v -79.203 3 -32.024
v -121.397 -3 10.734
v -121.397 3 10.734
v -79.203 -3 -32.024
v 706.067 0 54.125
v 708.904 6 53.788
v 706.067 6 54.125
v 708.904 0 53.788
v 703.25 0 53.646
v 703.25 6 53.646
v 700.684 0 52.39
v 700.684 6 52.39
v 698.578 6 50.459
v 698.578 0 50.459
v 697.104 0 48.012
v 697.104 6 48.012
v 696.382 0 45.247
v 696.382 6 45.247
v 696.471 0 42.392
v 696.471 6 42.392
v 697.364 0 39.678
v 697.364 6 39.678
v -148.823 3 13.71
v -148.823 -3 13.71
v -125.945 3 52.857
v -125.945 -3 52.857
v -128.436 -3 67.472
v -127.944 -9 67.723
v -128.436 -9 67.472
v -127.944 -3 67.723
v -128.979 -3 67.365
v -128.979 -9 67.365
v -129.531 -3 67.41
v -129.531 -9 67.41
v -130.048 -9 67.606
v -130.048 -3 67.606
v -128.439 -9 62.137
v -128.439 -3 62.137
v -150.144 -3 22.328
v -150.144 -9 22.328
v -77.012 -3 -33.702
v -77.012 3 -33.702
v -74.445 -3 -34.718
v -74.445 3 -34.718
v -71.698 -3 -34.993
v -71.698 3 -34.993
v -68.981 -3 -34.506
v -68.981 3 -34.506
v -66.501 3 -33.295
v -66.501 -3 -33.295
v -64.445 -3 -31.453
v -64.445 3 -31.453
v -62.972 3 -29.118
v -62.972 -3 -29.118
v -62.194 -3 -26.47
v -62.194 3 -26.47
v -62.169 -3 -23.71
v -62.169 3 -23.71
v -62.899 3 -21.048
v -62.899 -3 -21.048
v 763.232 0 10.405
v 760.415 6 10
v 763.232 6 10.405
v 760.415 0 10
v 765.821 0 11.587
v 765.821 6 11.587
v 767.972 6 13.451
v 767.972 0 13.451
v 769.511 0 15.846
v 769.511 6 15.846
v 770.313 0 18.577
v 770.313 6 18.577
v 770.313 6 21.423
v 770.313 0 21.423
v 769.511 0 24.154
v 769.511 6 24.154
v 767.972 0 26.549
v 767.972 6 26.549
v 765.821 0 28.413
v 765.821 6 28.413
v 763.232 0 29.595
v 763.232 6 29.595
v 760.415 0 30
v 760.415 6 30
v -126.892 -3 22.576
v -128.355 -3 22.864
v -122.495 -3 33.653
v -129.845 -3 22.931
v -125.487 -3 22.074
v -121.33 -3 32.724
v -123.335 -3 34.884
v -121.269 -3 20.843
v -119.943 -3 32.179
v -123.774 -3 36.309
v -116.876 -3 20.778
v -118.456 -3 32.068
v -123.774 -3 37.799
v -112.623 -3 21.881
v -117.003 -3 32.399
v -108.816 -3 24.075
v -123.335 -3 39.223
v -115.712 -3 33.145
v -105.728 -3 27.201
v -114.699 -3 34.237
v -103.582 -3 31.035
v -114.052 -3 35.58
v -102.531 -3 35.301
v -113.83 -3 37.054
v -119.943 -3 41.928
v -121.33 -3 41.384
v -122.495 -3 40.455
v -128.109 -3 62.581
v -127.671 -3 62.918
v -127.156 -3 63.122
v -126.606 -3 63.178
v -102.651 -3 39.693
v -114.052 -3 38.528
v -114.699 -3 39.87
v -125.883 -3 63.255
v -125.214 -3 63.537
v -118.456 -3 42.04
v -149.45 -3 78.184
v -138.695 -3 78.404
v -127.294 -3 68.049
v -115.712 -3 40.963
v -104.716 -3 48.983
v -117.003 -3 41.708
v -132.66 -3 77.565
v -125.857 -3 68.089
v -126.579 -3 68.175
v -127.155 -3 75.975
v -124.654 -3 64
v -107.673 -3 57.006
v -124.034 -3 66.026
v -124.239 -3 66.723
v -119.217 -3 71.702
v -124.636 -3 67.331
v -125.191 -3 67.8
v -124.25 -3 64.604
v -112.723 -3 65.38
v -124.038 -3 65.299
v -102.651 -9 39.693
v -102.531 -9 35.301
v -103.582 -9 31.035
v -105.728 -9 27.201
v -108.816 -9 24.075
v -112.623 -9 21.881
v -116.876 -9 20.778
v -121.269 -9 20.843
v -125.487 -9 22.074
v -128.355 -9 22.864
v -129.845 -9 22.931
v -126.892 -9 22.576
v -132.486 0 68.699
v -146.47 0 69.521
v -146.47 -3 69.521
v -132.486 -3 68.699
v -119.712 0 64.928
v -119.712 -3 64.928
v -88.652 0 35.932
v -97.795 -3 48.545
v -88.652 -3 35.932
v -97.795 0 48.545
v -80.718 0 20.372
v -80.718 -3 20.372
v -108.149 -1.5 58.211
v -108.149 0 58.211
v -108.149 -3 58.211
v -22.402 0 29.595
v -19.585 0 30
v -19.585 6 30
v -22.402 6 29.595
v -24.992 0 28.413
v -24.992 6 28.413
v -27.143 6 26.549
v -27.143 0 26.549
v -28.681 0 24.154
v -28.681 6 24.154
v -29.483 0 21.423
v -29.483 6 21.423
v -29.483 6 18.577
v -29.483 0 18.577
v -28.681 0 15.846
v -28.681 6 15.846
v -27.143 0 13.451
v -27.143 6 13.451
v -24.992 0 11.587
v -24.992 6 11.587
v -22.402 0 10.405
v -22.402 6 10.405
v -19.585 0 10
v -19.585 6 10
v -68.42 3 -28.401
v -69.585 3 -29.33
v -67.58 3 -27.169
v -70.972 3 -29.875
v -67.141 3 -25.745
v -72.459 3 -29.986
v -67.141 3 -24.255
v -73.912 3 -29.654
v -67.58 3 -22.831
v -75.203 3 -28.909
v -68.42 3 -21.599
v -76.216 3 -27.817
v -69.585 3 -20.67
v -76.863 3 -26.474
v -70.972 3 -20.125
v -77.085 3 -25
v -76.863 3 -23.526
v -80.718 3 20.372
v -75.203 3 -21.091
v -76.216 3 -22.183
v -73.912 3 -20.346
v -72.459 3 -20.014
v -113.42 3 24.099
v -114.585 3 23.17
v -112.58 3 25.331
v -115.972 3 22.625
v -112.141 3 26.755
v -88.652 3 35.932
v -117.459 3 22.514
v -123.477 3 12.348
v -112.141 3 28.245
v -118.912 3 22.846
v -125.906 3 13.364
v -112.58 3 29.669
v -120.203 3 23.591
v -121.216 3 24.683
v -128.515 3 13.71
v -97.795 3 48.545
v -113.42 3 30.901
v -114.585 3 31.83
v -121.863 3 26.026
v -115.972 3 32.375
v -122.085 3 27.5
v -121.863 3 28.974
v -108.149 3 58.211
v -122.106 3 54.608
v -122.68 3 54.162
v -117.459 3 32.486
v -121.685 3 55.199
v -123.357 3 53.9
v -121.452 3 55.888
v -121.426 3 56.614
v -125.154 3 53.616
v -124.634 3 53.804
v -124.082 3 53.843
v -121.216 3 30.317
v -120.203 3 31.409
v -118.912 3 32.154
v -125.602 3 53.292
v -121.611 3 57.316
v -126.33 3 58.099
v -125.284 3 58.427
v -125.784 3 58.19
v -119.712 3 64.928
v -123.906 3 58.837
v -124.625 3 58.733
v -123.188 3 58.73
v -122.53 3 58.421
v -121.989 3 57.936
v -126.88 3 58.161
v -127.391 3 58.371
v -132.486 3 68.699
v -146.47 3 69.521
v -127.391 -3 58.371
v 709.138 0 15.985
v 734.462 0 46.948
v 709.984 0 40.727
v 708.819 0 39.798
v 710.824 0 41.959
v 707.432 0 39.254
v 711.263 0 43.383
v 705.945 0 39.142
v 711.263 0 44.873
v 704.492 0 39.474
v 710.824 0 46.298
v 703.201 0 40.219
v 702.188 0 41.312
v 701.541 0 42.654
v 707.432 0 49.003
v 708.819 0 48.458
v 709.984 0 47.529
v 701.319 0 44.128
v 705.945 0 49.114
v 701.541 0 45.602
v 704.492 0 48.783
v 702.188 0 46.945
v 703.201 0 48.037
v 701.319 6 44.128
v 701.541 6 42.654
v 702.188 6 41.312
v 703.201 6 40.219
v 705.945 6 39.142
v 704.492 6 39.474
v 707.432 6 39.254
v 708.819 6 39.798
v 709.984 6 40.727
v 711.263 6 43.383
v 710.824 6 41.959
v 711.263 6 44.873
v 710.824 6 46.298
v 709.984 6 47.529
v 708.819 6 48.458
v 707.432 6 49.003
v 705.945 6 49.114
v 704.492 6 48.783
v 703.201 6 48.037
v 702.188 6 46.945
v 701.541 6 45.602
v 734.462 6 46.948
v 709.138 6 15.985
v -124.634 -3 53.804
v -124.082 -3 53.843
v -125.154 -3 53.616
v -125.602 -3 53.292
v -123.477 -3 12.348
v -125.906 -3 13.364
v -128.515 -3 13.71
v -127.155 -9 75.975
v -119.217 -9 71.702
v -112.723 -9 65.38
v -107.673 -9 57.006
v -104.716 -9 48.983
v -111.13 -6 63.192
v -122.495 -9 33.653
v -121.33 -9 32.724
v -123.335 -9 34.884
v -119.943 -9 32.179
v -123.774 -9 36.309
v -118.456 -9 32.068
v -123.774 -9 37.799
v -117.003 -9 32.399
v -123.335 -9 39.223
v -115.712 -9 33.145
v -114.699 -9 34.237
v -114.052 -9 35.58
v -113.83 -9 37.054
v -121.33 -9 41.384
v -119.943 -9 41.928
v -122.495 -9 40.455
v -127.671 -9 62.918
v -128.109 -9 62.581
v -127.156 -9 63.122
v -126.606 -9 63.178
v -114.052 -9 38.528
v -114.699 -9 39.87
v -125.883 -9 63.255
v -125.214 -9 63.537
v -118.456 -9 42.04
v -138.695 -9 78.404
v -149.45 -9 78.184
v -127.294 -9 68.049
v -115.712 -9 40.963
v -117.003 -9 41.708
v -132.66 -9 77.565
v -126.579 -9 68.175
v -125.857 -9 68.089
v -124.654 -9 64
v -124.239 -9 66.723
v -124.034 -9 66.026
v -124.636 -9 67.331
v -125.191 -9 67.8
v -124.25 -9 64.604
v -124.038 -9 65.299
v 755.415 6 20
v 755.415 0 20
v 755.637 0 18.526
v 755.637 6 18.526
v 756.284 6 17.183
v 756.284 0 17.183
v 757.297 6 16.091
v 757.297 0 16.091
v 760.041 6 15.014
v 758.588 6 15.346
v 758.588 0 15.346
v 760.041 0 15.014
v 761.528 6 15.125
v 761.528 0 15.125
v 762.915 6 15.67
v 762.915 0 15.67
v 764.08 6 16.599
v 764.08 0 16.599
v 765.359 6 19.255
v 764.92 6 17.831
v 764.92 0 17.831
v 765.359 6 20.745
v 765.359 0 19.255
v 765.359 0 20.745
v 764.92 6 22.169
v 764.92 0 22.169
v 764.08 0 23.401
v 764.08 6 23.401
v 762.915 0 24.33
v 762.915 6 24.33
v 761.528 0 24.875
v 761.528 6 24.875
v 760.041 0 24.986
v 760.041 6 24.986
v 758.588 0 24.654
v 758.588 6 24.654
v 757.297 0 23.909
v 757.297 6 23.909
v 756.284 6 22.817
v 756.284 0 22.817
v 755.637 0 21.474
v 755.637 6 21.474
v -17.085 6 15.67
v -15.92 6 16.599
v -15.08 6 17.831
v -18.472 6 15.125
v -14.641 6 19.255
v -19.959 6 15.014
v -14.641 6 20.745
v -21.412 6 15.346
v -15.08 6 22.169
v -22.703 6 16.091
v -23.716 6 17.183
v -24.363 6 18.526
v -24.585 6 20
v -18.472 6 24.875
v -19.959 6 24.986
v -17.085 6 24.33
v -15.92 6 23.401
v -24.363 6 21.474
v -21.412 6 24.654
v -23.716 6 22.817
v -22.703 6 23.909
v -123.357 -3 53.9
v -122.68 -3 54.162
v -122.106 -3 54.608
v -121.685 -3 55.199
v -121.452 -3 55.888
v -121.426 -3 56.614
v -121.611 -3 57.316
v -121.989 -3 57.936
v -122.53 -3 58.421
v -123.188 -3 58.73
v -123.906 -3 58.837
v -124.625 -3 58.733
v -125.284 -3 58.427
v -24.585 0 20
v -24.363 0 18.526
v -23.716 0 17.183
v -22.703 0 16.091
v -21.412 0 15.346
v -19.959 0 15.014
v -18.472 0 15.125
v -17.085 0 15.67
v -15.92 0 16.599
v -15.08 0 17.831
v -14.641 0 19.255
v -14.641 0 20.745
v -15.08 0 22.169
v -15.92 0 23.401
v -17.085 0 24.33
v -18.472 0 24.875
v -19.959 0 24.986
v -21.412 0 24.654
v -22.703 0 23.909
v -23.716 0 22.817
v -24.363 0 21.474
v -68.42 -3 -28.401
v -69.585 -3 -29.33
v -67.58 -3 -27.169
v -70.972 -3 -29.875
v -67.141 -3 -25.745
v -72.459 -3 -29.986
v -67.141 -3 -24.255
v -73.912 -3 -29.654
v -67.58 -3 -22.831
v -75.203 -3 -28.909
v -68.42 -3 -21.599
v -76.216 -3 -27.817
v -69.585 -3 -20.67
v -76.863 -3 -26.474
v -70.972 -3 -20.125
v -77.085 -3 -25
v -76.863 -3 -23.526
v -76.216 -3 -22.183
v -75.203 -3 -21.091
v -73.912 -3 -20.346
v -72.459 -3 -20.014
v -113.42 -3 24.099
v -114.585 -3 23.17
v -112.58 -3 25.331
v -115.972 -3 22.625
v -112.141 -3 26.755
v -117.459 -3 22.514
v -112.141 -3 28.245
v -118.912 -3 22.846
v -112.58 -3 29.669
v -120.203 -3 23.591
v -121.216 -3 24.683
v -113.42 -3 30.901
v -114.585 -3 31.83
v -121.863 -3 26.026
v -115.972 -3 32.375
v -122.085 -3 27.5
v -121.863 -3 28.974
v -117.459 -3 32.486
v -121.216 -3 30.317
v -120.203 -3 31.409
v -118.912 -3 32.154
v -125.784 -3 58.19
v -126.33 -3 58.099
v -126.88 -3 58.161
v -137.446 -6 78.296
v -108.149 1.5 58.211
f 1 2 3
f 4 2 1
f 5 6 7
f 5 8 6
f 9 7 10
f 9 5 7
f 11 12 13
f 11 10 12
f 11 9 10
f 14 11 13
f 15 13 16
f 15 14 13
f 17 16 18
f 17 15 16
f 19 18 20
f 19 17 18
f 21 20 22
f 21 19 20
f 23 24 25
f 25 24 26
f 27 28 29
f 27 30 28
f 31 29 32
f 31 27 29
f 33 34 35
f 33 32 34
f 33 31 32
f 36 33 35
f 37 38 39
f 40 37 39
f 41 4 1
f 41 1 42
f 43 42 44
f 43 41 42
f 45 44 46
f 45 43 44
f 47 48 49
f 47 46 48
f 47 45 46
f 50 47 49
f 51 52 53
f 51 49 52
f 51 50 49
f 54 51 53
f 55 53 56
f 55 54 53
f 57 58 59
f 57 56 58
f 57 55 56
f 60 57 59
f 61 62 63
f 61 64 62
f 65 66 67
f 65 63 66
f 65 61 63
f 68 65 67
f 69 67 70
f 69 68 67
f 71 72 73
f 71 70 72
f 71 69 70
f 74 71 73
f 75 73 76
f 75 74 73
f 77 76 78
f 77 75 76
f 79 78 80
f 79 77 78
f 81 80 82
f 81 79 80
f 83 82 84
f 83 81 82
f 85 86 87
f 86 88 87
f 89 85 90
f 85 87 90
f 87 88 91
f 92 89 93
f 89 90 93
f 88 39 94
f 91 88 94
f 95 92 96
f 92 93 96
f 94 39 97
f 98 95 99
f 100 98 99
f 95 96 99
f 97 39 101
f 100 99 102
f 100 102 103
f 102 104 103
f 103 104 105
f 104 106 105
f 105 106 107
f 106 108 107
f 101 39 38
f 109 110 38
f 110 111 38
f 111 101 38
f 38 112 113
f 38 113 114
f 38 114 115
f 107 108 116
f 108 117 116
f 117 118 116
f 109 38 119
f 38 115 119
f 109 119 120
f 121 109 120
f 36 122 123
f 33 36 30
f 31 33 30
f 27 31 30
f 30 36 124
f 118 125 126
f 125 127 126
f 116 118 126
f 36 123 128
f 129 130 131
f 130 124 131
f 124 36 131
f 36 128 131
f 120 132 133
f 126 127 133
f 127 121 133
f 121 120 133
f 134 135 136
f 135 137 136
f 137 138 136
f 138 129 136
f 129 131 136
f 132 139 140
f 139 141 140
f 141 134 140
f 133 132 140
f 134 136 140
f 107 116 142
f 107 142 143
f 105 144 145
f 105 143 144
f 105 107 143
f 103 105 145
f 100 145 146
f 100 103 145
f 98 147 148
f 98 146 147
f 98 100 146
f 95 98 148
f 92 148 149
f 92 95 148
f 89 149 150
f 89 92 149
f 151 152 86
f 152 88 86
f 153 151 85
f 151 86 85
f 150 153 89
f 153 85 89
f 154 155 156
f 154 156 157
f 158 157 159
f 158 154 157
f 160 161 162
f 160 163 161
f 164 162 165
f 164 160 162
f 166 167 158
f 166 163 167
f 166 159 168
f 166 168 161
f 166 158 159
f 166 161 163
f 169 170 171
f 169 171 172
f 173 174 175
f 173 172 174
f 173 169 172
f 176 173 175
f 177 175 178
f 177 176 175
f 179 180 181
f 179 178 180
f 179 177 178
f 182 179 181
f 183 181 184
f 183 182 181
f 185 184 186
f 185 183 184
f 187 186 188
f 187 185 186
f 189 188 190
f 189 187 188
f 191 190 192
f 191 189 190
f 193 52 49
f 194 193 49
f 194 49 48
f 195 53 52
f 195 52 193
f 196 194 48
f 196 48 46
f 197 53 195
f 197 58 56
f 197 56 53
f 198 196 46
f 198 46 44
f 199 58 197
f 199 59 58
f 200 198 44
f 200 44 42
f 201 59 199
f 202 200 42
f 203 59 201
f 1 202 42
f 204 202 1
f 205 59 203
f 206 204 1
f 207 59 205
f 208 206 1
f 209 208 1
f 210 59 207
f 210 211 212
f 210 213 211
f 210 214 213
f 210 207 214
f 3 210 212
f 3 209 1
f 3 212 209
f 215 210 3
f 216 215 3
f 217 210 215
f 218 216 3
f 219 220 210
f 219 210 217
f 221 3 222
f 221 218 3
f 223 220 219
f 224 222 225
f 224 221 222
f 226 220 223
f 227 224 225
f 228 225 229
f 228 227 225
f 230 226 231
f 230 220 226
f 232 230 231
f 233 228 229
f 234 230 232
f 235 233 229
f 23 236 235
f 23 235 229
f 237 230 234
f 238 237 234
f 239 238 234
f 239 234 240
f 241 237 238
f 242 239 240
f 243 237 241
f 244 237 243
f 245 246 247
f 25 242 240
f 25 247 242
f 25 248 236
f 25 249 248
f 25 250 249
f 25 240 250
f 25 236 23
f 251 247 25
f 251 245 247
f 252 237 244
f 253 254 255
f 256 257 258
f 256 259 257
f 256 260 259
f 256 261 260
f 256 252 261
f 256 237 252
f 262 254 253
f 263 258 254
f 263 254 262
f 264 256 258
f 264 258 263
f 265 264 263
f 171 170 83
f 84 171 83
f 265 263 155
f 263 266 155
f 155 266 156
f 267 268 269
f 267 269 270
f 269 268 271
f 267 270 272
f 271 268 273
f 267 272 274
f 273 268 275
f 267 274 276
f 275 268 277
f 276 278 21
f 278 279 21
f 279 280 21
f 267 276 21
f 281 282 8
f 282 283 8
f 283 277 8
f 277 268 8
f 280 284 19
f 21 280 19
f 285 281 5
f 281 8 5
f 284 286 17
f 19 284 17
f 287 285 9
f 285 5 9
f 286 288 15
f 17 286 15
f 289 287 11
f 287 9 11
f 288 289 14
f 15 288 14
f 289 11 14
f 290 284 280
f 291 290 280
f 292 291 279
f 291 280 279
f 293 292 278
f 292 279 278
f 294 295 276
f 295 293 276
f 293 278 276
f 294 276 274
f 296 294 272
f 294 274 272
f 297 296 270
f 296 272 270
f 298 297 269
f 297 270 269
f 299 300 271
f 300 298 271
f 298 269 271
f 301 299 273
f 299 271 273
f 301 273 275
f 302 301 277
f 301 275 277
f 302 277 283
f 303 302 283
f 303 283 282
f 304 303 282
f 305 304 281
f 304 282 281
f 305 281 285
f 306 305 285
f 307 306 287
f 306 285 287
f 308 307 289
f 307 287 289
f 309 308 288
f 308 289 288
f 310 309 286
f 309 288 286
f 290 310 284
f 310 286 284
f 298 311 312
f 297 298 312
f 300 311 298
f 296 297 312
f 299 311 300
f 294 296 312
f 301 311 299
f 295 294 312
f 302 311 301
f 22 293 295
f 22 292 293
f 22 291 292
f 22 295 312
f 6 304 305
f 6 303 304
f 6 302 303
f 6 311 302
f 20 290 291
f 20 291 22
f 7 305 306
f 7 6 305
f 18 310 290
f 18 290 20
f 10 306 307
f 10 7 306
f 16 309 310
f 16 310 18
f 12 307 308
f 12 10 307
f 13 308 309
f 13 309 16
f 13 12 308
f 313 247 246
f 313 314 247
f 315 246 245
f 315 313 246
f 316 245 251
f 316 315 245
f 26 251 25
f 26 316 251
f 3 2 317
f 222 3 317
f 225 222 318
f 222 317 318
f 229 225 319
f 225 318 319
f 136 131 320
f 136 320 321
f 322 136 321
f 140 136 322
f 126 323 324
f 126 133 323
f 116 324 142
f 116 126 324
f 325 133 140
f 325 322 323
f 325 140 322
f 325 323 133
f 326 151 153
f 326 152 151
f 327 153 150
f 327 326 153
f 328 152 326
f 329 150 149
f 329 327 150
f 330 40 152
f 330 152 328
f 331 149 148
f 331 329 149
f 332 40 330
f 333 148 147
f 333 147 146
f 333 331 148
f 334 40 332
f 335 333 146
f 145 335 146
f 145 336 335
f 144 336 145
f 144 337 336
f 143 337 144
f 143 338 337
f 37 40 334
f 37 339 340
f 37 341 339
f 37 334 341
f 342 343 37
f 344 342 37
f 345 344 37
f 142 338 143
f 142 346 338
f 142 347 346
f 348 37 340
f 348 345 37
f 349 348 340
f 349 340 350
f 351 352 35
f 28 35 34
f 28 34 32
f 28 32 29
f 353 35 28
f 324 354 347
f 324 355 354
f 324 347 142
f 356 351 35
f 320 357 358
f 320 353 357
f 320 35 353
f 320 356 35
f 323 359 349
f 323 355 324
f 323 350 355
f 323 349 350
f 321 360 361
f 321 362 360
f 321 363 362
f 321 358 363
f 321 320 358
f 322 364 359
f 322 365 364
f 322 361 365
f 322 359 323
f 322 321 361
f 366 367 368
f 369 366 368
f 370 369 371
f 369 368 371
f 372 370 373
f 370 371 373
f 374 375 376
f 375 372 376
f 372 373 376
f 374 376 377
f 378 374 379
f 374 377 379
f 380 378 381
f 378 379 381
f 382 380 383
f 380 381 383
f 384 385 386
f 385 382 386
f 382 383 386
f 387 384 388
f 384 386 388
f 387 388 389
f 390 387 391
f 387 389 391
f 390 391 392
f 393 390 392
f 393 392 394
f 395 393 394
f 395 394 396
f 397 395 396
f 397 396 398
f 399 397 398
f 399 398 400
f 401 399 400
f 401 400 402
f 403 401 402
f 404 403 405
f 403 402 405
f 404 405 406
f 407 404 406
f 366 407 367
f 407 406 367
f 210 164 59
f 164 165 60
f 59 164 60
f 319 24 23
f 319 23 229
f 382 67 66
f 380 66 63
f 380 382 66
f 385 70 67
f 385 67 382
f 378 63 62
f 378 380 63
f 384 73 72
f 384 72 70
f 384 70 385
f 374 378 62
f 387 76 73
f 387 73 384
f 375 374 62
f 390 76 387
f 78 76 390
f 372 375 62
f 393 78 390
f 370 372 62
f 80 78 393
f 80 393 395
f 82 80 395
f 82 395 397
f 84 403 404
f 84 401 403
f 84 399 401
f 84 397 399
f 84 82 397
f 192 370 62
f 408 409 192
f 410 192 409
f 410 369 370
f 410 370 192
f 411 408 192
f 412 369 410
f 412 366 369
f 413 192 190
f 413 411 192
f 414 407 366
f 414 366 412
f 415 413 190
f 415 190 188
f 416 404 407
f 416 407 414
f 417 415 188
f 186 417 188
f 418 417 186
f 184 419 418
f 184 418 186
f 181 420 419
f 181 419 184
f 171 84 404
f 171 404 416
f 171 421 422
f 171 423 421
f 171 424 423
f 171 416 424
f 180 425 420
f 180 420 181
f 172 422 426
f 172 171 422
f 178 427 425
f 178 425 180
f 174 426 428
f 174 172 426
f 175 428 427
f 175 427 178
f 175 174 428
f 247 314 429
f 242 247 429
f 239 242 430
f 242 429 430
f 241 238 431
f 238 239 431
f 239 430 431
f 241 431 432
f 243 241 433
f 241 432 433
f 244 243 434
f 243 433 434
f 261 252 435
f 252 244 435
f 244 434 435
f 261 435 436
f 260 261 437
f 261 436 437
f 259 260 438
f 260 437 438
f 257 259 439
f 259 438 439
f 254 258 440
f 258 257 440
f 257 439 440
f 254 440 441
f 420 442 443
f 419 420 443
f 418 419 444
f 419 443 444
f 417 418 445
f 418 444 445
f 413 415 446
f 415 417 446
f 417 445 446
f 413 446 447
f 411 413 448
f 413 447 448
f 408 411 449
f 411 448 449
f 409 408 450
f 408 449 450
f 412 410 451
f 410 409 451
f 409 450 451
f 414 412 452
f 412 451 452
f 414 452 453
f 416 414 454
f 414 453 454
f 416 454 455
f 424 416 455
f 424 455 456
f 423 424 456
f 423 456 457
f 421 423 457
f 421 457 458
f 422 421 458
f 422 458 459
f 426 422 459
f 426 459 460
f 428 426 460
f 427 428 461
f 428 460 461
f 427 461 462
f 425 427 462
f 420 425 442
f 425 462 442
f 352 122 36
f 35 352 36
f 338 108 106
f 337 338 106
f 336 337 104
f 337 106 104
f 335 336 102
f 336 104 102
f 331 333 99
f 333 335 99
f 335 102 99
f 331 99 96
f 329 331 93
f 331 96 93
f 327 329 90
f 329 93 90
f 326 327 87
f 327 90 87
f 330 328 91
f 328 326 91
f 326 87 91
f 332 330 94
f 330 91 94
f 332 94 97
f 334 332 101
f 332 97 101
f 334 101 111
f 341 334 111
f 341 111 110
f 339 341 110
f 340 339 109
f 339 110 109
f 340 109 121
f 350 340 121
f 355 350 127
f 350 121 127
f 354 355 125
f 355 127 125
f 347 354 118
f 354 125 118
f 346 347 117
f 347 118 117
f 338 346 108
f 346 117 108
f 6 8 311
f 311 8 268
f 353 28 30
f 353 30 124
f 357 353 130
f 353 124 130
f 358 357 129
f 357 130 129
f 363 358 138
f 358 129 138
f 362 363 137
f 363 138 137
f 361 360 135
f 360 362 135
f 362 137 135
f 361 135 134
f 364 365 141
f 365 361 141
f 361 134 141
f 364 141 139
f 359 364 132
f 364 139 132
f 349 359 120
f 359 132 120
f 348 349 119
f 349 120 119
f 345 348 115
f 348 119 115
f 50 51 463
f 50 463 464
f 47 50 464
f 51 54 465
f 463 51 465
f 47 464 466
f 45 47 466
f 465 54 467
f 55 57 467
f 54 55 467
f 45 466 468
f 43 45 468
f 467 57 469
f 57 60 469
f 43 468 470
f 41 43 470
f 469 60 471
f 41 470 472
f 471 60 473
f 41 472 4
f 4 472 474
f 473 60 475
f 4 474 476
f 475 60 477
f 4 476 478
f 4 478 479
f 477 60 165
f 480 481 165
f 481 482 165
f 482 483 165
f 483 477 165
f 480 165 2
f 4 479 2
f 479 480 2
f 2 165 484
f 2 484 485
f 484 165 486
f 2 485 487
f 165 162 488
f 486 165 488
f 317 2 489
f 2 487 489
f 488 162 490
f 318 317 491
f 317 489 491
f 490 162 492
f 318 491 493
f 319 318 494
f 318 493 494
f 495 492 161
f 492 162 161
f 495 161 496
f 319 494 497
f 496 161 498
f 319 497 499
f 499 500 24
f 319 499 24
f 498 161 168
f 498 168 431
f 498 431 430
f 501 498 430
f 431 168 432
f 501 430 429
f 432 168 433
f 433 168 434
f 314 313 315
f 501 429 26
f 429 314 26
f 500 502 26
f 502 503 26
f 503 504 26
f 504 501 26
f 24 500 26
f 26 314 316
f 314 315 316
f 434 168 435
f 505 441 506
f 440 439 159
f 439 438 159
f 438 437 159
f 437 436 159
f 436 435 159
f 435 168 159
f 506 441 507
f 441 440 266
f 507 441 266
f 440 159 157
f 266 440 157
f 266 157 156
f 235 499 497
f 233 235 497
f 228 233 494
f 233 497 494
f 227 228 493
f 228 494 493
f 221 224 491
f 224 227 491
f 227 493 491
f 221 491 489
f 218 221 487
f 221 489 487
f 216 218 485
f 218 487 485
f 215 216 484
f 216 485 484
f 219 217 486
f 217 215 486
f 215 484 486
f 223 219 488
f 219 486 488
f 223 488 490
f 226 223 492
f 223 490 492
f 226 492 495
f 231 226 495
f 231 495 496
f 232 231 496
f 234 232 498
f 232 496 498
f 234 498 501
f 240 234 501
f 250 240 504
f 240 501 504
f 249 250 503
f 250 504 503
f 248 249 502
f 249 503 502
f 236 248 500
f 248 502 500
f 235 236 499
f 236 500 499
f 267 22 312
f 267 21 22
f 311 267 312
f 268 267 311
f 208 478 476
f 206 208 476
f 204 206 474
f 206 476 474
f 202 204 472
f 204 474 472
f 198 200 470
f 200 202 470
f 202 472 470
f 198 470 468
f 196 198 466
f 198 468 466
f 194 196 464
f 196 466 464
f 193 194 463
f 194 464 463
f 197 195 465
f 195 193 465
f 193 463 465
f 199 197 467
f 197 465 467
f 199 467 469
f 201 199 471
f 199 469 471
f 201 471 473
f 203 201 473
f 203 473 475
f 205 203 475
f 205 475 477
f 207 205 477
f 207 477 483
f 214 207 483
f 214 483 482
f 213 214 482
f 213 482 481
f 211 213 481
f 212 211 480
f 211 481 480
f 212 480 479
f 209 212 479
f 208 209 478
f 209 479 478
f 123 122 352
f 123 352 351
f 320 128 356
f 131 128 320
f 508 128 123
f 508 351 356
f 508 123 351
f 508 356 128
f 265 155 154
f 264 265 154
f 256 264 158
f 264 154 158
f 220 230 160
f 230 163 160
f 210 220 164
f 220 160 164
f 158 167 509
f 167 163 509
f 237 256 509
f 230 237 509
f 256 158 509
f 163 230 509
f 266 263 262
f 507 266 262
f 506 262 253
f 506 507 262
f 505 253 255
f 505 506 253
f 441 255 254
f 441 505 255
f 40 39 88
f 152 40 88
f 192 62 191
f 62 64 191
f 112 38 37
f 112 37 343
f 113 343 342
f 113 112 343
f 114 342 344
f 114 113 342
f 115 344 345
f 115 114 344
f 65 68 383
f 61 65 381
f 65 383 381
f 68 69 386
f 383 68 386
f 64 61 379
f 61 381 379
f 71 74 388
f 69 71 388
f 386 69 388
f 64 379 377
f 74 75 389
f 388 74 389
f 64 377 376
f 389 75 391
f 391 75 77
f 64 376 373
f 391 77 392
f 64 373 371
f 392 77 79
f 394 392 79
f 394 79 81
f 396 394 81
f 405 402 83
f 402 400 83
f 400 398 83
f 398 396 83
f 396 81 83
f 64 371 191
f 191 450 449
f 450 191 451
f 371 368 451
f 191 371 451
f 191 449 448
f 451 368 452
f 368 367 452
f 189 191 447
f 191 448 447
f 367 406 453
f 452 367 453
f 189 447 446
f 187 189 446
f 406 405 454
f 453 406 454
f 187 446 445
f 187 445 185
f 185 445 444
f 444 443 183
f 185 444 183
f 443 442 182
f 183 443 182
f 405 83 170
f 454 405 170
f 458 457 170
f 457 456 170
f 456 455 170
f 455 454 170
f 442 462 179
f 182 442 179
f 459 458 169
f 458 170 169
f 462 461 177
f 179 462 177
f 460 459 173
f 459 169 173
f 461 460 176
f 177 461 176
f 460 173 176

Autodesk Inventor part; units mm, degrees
ref_plane "YZ Plane" through (0, 0, 0) normal (1, 0, 0) x (0, 1, 0)
ref_plane "XZ Plane" through (0, 0, 0) normal (0, 1, 0) x (-1, 0, 0)
ref_plane "XY Plane" through (0, 0, 0) normal (0, 0, 1) x (1, 0, 0)
sketch "Sketch1" plane through (0, 0, 0) normal (0, 1, 0) x (-1, 0, 0)
  line L0 (-32.0851, 0) -> (32.0851, 0)
  circle A0 centre (-707.9149, -25) radius 9.525 construction
  circle A1 centre (-708.1649, 701) radius 16.5354 construction
  line L1 (-708.1649, 701) -> (-707.9149, -25) construction
  line L2 (-707.9149, -25) -> (-1167.5404, 536.979)
  circle A2 centre (-707.9149, -25) radius 726 construction
  line L3 (-727.2668, -40.8273) -> (-1186.8923, 521.1517) construction
  line L4 (-1186.8923, 521.1517) -> (-1148.1885, 552.8064) construction
  line L5 (-1148.1885, 552.8064) -> (-688.563, -9.1727) construction
  line L6 (-688.563, -9.1727) -> (-727.2668, -40.8273) construction
  line L7 (-727.2668, -40.8273) -> (-1148.1885, 552.8064) construction
  line L8 (-1186.8923, 521.1517) -> (-688.563, -9.1727) construction
  line L9 (-1433.9063, -50.25) -> (-1433.9235, -0.25) construction
  line L10 (-707.9235, 0) -> (-707.9063, -50) construction
  circle A3 centre (-707.9149, -25) radius 52.5 construction
  line L11 (-697.3638, 39.6777) -> (-709.1385, 15.9848)
  line L12 (-708.9043, 53.7882) -> (-734.4622, 46.9478)
  arc A4 (-697.3638, 39.6777) -> (-708.9043, 53.7882) centre (-706.3189, 44.1282) ccw
  circle A5 centre (-706.3189, 44.1282) radius 5
  line L13 (-706.3189, 44.1282) -> (-741.1523, 15.639) construction
  circle A6 centre (72.0851, -25) radius 5
  arc A7 (62.8991, -21.0481) -> (80.3122, -19.3154) centre (72.0851, -25) ccw
  circle A8 centre (72.0851, -25) radius 87.2511 construction
  line L14 (176.9747, 84.4532) -> (127.3309, 55.4404) construction
  circle A9 centre (72.0851, -25) radius 151.5976 construction
  circle A10 centre (-707.9149, -25) radius 69.1466 construction
  line L15 (-707.9387, 44.1466) -> (-777.0615, -25) construction
  line L16 (80.7183, 20.3721) -> (62.8991, -21.0481)
  line L17 (-707.933, 27.5) -> (-662.933, 27.5155) construction
  circle A11 centre (72.0851, -25) radius 52.5 construction
  circle A12 centre (72.0851, -25) radius 69.1466 construction
  line L18 (72.0851, 27.5) -> (117.0851, 27.5) construction
  circle A13 centre (117.0851, 27.5) radius 5
  arc A14 (125.2839, 58.4267) -> (124.0817, 53.8433) centre (123.911, 56.3374) ccw
  line L19 (148.823, 13.7104) -> (125.945, 52.8571)
  arc A15 (125.2839, 58.4267) -> (127.3914, 58.3714) centre (126.3822, 60.0981) ccw
  arc A16 (125.945, 52.8571) -> (124.0817, 53.8433) centre (124.2183, 51.8479) ccw
  line L20 (-709.1385, 15.9848) -> (-734.4622, 46.9478)
  line L21 (148.823, 13.7104) -> (128.5153, 13.7104)
  line L22 (121.3974, 10.7344) -> (79.203, -32.024)
  arc A17 (128.5153, 13.7104) -> (121.3974, 10.7344) centre (128.5153, 3.7104) ccw
  line L23 (123.911, 56.3374) -> (175.7133, 86.6116) construction
  line L24 (154.1852, 4.5352) -> (123.911, 56.3374) construction
  line L25 (117.0851, 27.5) -> (-662.933, 27.5155) construction
  line L26 (117.0853, 37.5) -> (-662.9328, 37.5155) construction
  line L27 (-662.9332, 17.5155) -> (117.0849, 17.5) construction
  arc A18 (117.0849, 17.5) -> (117.0853, 37.5) centre (117.0851, 27.5) ccw construction
  arc A19 (-662.9328, 37.5155) -> (-662.9332, 17.5155) centre (-662.933, 27.5155) ccw construction
  line L28 (-732.9149, -5) -> (367.0851, -5) construction
  line L29 (-732.9149, 0) -> (367.0851, 0) construction
  line L30 (-760.4149, -25) -> (-760.4149, 20) construction
  line L31 (19.5851, -25) -> (19.5851, 20) construction
  line L32 (19.5851, 20) -> (-760.4149, 20) construction
  line L33 (19.5851, 30) -> (-760.4149, 30)
  line L34 (-760.4149, 10) -> (19.5851, 10)
  arc A20 (19.5851, 10) -> (19.5851, 30) centre (19.5851, 20) ccw
  arc A21 (-760.4149, 30) -> (-760.4149, 10) centre (-760.4149, 20) ccw
  line L35 (146.4702, 69.5214) -> (102.7028, 71.4745) construction
  line L36 (102.7028, 71.4745) -> (80.7183, 20.3721) construction
  spline S0 degree 2 poles (146.4702, 69.5214) (102.7028, 71.4745) (80.7183, 20.3721) knots 1 1 1 2 2 2
  line L37 (127.3914, 58.3714) -> (146.4702, 69.5214)
  circle A22 centre (19.5851, 20) radius 5
  circle A23 centre (-760.4149, 20) radius 5
  point P0 (0, 0)
  point P1 (0, 0)
  point P2 (-937.7276, 255.9895)
  point P3 (-707.9149, -25)
  point P4 (126.0694, 57.5988)
  point P5 (130.1781, 60)
  point P6 (125.1724, 54.179)
  point P7 (132.8635, 61.5694)
  point P8 (-272.9239, 27.5077)
  point P9 (-370.4149, 20)
  dimension "d8" = 50
  dimension "d9" = 50
  dimension "d10" = 105
  dimension "d13" = 10
  dimension "d14" = 20
  dimension "d15" = 20
  dimension "d16" = 40
  dimension "d17" = 10
  dimension "d18" = 780
  dimension "d19" = 20
  dimension "d23" = 45
  dimension "d24" = 10
  dimension "d26" = 5
  dimension "d27" = 2
  dimension "d28" = 45
  dimension "d31" = 69.147
  dimension "d32" = 10
  dimension "d33" = 20
  dimension "d34" = 20
  dimension "d35" = 780
  dimension "d36" = 10
  dimension "d37" = 10
extrude "Extrusion1" add sketch "Sketch1" along normal mid plane 6 contours L16 S0 L37 A15 A14 A16 L19 L21 A17 L22 A7
extrude "Extrusion3" add sketch "Sketch1" along normal blind 6 separate body contours L33 L11 L20 | L20 L12 A4 L11 L33
extrude "Extrusion4" add sketch "Sketch1" along normal blind 6 separate body contours L34 A21 L33 L2 | L2 L33 L20 L11 A20 L34 | L33 L11 L20
sketch "Sketch3" plane through (0, -3, 0) normal (0, -1, 0) x (1, 0, 0)
  circle A0 centre (-118.8299, 37.0538) radius 5 projected
  circle A1 centre (-72.2906, -14.0866) radius 5 projected
  line L0 (-63.226, -9.8637) -> (-82.2675, 31.0091) projected
  spline S0 degree 2 poles (-82.2675, 31.0091) (-105.7599, 81.436) (-149.45, 78.184) knots 1 1 1 2 2 2 projected
  line L1 (-149.45, 78.184) -> (-130.0484, 67.6055) projected
  arc A2 (-130.0484, 67.6055) -> (-127.9435, 67.7234) centre (-129.091, 69.3615) ccw projected
  arc A3 (-126.6058, 63.1776) -> (-127.9435, 67.7234) centre (-126.5092, 65.6758) ccw projected
  arc A4 (-126.6058, 63.1776) -> (-128.4389, 62.1366) centre (-126.683, 61.1791) ccw projected
  line L2 (-128.4389, 62.1366) -> (-150.1443, 22.3278) projected
  line L3 (-150.1443, 22.3278) -> (-129.8455, 22.9309) projected
  arc A5 (-122.6424, 20.1675) -> (-129.8455, 22.9309) centre (-129.5485, 12.9353) ccw projected
  line L4 (-122.6424, 20.1675) -> (-79.1967, -21.3189) projected
  arc A6 (-79.1967, -21.3189) -> (-63.226, -9.8637) centre (-72.2906, -14.0866) ccw projected
  arc A7 (-125.4874, 22.0735) -> (-102.6507, 39.693) centre (-118.8299, 37.0538) ccw
  line L5 (-149.45, 78.184) -> (-109.6014, 82.3028) construction
  line L6 (-109.6014, 82.3028) -> (-102.6507, 39.693) construction
  spline S1 degree 2 poles (-149.45, 78.184) (-109.6014, 82.3028) (-102.6507, 39.693) knots 1 1 1 2 2 2
  point P0 (0, 0)
extrude "Extrusion5" add sketch "Sketch3" along normal blind 6 separate body contours S1 A7 A5 L3 L2 A4 A3 A2 L1 S0 | S0 S1
properties part number "Soporte freno"
